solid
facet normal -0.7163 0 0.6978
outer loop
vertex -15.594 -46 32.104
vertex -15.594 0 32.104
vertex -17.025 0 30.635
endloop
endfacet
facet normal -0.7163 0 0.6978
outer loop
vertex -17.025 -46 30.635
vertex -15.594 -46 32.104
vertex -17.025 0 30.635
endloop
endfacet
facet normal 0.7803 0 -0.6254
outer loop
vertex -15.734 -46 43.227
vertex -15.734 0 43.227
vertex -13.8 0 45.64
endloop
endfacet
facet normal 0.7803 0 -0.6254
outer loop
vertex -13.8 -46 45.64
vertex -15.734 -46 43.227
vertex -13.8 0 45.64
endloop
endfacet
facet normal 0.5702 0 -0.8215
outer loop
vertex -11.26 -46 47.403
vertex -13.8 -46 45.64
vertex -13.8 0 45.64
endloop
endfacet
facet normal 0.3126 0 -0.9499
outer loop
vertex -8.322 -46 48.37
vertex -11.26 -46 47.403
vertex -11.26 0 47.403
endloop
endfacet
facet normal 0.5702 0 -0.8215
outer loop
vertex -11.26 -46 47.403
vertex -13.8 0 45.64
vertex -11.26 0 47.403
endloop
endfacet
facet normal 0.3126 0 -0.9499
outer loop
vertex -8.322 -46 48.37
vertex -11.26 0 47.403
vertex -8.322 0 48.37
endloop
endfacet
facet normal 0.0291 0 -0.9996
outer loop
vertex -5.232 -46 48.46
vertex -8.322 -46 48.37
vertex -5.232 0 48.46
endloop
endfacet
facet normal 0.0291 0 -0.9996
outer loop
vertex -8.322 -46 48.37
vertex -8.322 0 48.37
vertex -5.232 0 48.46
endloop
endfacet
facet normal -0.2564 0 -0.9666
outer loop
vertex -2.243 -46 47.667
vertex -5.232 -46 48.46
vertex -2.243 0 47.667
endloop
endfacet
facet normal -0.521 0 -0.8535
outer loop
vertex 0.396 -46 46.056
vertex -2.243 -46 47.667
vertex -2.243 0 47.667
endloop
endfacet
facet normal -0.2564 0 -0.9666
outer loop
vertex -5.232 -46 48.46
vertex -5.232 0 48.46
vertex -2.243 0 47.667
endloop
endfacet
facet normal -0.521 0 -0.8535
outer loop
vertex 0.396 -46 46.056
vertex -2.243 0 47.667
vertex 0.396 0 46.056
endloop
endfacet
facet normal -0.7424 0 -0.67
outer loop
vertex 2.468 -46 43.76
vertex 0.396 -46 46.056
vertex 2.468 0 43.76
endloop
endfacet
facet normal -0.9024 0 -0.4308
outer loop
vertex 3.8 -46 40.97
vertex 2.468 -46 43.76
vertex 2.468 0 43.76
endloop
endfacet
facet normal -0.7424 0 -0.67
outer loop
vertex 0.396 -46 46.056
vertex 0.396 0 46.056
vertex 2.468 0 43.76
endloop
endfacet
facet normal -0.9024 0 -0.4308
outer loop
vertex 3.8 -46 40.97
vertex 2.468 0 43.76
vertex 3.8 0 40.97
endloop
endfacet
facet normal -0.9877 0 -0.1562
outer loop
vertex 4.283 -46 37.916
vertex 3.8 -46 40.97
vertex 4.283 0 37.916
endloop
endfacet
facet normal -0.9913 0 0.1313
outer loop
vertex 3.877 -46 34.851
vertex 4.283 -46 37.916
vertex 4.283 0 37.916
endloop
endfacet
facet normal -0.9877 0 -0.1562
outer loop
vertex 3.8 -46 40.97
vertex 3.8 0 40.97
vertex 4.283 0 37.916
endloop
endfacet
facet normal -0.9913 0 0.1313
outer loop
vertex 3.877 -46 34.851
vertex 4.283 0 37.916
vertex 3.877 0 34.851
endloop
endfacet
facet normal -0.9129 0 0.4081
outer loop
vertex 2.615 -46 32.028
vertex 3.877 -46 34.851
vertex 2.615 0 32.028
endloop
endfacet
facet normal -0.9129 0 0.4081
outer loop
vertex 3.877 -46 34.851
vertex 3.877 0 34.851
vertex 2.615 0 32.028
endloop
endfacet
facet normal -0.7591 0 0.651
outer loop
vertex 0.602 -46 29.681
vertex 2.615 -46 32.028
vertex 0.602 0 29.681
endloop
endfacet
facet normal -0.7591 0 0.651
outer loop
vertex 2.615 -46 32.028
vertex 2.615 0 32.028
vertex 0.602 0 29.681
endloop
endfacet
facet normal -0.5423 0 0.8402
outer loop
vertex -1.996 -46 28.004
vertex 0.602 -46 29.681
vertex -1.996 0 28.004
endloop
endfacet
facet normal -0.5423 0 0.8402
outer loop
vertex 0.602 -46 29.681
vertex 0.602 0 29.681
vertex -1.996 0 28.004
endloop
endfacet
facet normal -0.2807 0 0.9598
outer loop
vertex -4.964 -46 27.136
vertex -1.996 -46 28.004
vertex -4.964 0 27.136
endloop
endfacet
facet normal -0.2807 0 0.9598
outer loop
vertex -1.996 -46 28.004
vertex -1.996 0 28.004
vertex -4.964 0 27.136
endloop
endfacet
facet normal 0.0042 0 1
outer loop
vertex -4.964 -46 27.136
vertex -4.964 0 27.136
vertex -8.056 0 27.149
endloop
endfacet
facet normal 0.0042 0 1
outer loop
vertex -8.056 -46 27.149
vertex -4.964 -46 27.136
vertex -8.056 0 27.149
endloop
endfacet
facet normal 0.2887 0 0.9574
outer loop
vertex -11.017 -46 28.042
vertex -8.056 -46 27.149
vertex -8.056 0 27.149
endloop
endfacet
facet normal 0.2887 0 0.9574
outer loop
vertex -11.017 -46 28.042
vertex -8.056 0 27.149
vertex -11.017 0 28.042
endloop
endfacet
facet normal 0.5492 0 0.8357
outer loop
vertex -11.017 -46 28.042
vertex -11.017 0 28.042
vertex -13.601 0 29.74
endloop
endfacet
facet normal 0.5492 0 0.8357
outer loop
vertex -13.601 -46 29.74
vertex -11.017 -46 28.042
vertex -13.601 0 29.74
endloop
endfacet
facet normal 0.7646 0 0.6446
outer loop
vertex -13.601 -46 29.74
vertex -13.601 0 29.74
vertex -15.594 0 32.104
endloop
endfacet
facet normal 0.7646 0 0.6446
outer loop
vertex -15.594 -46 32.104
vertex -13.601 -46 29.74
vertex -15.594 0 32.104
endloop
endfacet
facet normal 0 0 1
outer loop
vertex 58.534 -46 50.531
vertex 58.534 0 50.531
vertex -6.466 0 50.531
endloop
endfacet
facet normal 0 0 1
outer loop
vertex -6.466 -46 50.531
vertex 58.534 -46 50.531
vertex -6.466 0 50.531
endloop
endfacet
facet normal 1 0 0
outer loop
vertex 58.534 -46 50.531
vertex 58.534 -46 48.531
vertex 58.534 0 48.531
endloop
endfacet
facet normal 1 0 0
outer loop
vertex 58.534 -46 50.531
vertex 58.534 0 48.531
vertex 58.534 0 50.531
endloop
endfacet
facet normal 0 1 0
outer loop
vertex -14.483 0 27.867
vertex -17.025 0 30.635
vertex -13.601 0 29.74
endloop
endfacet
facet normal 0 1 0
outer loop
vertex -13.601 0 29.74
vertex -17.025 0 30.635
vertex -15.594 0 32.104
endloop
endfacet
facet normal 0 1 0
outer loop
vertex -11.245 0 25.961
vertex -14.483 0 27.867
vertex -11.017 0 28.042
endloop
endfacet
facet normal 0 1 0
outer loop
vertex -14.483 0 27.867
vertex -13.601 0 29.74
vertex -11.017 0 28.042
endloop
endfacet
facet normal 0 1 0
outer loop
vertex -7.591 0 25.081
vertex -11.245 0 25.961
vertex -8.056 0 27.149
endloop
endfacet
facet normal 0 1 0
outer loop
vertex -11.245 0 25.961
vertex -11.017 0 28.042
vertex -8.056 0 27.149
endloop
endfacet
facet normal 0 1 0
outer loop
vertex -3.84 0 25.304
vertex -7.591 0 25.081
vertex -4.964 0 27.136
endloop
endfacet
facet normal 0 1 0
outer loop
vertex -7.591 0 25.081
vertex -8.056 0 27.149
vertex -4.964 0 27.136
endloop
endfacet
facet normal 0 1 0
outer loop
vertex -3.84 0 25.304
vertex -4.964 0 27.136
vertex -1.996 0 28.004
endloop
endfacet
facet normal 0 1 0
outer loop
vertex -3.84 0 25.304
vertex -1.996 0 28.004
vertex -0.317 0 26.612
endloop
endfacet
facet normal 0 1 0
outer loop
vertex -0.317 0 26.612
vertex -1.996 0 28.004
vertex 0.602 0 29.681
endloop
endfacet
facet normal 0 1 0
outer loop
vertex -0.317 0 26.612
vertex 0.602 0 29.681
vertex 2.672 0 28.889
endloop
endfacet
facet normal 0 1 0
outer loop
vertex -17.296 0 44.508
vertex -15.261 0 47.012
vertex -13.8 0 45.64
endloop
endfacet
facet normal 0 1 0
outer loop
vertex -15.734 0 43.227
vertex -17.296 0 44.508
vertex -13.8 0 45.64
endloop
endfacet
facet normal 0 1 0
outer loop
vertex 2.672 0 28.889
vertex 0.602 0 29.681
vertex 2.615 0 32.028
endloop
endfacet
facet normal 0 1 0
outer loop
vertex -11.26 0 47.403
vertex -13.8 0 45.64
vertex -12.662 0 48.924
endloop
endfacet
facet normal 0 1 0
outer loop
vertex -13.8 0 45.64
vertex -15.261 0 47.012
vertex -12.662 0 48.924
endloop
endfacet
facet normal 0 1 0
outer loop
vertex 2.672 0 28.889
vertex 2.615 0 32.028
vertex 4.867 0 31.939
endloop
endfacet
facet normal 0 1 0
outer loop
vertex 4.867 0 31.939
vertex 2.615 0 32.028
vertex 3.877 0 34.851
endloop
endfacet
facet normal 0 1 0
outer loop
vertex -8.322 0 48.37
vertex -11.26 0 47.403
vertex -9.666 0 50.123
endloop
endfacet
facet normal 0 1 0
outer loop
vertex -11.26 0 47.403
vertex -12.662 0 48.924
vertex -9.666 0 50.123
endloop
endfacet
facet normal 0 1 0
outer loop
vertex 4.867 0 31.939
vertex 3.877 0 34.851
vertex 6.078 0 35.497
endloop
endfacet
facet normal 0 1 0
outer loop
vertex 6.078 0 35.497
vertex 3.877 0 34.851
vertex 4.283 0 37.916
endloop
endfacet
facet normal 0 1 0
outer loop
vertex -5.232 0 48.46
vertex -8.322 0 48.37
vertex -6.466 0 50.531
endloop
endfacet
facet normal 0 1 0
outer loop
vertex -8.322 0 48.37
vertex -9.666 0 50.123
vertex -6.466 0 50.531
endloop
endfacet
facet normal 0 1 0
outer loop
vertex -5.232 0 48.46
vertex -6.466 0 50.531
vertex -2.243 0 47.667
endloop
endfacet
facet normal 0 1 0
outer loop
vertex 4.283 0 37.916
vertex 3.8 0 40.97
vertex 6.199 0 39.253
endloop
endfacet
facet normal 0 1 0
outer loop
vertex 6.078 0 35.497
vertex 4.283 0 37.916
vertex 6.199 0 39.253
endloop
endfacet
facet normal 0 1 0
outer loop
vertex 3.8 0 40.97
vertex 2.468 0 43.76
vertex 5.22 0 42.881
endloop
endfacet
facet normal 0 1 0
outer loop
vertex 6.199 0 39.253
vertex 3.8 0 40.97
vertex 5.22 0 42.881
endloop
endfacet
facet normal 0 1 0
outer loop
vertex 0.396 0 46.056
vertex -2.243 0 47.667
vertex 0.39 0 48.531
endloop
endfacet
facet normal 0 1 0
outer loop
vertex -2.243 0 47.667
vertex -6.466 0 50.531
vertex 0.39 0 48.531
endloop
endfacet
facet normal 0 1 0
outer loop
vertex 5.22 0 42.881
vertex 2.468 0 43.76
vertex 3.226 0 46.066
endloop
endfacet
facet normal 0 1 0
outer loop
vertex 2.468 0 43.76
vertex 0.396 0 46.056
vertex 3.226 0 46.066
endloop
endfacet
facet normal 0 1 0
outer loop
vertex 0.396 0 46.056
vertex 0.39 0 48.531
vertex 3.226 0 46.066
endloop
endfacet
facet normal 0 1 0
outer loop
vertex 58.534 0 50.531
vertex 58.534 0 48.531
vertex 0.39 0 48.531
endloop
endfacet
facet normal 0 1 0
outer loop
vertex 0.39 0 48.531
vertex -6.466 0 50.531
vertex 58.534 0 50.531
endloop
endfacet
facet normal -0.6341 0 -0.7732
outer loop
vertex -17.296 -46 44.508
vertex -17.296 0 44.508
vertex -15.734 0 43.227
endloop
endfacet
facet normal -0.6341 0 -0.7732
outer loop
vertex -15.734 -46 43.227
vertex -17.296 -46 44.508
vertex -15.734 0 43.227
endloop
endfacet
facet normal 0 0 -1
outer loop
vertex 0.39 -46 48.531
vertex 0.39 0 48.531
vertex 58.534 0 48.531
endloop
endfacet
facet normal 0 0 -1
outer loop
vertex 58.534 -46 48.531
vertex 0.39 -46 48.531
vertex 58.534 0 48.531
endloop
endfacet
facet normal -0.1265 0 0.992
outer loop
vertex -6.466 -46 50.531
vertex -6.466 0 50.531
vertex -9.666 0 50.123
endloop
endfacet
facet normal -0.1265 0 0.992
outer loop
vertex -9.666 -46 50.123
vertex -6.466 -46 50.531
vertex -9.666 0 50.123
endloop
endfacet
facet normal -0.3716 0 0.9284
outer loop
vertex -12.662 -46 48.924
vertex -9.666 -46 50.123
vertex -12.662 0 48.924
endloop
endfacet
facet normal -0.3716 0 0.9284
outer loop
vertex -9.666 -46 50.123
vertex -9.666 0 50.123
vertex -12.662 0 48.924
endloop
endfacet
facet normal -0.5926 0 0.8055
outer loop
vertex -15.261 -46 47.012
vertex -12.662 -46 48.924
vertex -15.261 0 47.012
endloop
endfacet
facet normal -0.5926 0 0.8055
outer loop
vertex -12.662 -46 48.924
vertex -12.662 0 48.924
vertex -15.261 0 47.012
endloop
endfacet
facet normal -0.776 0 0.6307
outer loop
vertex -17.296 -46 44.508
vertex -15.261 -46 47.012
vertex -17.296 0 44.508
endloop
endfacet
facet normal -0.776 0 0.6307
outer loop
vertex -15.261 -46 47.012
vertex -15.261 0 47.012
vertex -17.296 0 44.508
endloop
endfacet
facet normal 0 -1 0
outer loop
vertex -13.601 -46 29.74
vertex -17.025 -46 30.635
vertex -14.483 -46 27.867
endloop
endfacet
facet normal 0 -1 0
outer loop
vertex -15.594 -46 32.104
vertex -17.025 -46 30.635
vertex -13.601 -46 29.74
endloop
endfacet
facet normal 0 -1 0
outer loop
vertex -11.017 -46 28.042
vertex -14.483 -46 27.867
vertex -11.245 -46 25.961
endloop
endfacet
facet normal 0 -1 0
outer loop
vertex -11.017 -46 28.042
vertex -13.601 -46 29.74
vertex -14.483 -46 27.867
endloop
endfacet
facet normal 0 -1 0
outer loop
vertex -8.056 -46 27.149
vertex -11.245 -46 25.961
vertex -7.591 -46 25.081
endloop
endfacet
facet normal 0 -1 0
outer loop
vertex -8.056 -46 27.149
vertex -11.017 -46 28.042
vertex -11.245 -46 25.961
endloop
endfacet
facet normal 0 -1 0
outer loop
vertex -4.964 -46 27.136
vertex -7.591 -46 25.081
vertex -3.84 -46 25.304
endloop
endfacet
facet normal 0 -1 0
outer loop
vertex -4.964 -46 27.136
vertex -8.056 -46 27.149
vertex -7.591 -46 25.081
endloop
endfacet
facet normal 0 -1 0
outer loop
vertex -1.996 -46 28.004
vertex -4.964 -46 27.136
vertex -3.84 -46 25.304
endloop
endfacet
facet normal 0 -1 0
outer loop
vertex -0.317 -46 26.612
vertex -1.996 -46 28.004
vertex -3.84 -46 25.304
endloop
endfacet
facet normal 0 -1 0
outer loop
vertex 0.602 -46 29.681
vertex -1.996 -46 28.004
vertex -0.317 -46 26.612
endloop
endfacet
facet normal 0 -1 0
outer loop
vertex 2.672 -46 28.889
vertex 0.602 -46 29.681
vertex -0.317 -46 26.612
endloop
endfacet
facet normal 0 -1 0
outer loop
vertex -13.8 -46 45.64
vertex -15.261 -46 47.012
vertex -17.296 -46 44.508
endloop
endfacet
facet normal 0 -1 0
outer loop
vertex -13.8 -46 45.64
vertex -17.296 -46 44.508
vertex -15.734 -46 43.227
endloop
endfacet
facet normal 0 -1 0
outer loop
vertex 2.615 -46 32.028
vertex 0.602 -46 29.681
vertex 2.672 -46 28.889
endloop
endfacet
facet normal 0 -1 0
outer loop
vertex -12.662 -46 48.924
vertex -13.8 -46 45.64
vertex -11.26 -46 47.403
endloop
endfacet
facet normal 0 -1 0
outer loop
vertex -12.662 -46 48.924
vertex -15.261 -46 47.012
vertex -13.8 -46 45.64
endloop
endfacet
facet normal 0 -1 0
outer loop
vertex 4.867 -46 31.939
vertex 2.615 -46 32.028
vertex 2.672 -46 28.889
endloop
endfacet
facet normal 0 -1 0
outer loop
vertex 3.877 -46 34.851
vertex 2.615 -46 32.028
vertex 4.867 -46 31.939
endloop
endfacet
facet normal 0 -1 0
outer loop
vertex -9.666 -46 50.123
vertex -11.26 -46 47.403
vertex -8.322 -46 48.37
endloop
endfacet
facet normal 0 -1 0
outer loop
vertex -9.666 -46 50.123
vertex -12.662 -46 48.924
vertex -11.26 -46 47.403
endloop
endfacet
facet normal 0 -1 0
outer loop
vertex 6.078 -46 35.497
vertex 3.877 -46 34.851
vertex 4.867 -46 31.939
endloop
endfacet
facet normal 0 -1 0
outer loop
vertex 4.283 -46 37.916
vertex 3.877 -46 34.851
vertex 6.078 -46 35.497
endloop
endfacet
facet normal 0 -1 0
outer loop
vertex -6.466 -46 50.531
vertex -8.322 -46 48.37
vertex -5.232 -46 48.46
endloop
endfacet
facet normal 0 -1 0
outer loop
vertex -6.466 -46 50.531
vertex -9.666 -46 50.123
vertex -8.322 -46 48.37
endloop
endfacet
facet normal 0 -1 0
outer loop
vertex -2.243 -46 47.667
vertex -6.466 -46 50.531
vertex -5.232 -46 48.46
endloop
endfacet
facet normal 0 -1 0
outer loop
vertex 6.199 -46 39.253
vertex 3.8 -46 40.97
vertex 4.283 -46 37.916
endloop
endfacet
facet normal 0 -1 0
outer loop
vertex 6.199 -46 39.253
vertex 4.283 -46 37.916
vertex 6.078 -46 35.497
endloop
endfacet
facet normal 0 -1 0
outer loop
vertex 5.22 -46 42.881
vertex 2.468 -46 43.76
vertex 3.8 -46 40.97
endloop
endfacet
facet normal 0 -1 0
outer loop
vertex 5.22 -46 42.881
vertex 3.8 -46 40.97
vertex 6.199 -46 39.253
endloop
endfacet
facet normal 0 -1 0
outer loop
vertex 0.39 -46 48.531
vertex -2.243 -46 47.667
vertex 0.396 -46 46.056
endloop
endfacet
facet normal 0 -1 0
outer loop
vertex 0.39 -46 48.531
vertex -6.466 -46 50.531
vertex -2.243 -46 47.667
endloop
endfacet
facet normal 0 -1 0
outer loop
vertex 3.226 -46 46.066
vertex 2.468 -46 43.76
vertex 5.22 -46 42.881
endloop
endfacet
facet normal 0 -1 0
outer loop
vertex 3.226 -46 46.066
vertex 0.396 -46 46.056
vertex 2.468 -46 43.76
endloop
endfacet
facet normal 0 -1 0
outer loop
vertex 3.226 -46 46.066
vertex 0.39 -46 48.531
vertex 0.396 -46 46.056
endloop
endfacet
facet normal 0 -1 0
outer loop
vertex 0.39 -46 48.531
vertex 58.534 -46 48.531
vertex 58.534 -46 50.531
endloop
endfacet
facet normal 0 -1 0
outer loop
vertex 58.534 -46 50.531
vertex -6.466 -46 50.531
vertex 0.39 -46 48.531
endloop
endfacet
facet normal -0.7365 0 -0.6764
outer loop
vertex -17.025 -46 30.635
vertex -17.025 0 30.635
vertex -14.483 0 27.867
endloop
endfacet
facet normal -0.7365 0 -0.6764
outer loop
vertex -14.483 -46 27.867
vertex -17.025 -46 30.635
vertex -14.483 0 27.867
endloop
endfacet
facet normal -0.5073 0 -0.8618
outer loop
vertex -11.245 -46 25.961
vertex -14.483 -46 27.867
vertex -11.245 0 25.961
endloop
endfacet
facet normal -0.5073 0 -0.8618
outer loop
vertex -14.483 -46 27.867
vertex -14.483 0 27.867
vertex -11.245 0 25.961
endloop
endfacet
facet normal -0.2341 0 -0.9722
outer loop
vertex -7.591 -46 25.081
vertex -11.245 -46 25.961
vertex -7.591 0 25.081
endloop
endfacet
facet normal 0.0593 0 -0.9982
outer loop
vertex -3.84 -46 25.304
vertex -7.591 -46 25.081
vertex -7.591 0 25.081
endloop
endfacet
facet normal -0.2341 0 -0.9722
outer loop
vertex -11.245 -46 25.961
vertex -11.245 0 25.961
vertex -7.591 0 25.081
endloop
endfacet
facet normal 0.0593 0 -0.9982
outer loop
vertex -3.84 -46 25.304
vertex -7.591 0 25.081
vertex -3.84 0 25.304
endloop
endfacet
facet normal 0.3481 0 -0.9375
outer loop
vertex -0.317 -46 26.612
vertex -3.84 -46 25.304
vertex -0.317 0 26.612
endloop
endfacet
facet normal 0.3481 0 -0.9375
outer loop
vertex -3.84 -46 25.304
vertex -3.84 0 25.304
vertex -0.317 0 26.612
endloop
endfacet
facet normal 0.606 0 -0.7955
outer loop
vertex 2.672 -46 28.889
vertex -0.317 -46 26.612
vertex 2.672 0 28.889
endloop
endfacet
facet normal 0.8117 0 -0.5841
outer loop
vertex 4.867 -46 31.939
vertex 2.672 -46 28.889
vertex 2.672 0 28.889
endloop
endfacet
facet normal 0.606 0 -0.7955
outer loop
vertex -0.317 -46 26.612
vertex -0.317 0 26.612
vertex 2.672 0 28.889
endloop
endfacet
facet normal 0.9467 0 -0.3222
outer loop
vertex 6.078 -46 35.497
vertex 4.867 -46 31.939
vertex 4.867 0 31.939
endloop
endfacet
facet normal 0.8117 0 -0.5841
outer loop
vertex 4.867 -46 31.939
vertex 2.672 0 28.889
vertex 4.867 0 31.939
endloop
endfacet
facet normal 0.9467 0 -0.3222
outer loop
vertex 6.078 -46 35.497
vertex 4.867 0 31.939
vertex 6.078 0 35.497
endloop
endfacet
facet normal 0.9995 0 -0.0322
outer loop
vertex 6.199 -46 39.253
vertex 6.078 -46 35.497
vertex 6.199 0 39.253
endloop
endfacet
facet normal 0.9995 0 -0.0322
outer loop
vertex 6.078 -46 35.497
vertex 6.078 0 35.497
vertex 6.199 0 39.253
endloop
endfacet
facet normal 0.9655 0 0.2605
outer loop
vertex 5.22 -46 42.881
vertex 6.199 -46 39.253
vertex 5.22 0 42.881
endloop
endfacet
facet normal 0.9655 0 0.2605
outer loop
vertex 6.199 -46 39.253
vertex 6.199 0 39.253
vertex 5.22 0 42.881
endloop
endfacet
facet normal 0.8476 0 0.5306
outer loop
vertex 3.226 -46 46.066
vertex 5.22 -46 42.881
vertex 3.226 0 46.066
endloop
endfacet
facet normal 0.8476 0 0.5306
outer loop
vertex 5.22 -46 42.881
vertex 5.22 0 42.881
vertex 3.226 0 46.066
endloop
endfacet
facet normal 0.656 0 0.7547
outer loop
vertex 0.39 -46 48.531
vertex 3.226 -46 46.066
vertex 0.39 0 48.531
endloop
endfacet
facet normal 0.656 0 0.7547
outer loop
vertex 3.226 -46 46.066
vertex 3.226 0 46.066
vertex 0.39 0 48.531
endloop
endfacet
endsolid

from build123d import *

# Parameters (mm, degrees)
F1_DEPTH = 46


with BuildPart() as f1:
    # F0 (on Front) → F1 (new body)
    with BuildSketch(Plane.XZ):
        with BuildLine():
            ThreePointArc((-15.733881, 43.227494), (4.28348, 37.915884), (-15.594438, 32.104143))
            Line((-15.594438, 32.104143), (-17.024878, 30.635102))
            ThreePointArc((-17.024878, 30.635102), (2.671941, 28.889199), (0.389979, 48.531132))
            Line((0.389979, 48.531132), (58.534325, 48.531132))
            Line((58.534325, 48.531132), (58.534325, 50.531132))
            Line((58.534325, 50.531132), (-6.465675, 50.531132))
            ThreePointArc((-6.465675, 50.531132), (-12.661991, 48.924209), (-17.296424, 44.508492))
            Line((-17.296424, 44.508492), (-15.733881, 43.227494))
        make_face()
    extrude(amount=F1_DEPTH)


solid = f1.part
